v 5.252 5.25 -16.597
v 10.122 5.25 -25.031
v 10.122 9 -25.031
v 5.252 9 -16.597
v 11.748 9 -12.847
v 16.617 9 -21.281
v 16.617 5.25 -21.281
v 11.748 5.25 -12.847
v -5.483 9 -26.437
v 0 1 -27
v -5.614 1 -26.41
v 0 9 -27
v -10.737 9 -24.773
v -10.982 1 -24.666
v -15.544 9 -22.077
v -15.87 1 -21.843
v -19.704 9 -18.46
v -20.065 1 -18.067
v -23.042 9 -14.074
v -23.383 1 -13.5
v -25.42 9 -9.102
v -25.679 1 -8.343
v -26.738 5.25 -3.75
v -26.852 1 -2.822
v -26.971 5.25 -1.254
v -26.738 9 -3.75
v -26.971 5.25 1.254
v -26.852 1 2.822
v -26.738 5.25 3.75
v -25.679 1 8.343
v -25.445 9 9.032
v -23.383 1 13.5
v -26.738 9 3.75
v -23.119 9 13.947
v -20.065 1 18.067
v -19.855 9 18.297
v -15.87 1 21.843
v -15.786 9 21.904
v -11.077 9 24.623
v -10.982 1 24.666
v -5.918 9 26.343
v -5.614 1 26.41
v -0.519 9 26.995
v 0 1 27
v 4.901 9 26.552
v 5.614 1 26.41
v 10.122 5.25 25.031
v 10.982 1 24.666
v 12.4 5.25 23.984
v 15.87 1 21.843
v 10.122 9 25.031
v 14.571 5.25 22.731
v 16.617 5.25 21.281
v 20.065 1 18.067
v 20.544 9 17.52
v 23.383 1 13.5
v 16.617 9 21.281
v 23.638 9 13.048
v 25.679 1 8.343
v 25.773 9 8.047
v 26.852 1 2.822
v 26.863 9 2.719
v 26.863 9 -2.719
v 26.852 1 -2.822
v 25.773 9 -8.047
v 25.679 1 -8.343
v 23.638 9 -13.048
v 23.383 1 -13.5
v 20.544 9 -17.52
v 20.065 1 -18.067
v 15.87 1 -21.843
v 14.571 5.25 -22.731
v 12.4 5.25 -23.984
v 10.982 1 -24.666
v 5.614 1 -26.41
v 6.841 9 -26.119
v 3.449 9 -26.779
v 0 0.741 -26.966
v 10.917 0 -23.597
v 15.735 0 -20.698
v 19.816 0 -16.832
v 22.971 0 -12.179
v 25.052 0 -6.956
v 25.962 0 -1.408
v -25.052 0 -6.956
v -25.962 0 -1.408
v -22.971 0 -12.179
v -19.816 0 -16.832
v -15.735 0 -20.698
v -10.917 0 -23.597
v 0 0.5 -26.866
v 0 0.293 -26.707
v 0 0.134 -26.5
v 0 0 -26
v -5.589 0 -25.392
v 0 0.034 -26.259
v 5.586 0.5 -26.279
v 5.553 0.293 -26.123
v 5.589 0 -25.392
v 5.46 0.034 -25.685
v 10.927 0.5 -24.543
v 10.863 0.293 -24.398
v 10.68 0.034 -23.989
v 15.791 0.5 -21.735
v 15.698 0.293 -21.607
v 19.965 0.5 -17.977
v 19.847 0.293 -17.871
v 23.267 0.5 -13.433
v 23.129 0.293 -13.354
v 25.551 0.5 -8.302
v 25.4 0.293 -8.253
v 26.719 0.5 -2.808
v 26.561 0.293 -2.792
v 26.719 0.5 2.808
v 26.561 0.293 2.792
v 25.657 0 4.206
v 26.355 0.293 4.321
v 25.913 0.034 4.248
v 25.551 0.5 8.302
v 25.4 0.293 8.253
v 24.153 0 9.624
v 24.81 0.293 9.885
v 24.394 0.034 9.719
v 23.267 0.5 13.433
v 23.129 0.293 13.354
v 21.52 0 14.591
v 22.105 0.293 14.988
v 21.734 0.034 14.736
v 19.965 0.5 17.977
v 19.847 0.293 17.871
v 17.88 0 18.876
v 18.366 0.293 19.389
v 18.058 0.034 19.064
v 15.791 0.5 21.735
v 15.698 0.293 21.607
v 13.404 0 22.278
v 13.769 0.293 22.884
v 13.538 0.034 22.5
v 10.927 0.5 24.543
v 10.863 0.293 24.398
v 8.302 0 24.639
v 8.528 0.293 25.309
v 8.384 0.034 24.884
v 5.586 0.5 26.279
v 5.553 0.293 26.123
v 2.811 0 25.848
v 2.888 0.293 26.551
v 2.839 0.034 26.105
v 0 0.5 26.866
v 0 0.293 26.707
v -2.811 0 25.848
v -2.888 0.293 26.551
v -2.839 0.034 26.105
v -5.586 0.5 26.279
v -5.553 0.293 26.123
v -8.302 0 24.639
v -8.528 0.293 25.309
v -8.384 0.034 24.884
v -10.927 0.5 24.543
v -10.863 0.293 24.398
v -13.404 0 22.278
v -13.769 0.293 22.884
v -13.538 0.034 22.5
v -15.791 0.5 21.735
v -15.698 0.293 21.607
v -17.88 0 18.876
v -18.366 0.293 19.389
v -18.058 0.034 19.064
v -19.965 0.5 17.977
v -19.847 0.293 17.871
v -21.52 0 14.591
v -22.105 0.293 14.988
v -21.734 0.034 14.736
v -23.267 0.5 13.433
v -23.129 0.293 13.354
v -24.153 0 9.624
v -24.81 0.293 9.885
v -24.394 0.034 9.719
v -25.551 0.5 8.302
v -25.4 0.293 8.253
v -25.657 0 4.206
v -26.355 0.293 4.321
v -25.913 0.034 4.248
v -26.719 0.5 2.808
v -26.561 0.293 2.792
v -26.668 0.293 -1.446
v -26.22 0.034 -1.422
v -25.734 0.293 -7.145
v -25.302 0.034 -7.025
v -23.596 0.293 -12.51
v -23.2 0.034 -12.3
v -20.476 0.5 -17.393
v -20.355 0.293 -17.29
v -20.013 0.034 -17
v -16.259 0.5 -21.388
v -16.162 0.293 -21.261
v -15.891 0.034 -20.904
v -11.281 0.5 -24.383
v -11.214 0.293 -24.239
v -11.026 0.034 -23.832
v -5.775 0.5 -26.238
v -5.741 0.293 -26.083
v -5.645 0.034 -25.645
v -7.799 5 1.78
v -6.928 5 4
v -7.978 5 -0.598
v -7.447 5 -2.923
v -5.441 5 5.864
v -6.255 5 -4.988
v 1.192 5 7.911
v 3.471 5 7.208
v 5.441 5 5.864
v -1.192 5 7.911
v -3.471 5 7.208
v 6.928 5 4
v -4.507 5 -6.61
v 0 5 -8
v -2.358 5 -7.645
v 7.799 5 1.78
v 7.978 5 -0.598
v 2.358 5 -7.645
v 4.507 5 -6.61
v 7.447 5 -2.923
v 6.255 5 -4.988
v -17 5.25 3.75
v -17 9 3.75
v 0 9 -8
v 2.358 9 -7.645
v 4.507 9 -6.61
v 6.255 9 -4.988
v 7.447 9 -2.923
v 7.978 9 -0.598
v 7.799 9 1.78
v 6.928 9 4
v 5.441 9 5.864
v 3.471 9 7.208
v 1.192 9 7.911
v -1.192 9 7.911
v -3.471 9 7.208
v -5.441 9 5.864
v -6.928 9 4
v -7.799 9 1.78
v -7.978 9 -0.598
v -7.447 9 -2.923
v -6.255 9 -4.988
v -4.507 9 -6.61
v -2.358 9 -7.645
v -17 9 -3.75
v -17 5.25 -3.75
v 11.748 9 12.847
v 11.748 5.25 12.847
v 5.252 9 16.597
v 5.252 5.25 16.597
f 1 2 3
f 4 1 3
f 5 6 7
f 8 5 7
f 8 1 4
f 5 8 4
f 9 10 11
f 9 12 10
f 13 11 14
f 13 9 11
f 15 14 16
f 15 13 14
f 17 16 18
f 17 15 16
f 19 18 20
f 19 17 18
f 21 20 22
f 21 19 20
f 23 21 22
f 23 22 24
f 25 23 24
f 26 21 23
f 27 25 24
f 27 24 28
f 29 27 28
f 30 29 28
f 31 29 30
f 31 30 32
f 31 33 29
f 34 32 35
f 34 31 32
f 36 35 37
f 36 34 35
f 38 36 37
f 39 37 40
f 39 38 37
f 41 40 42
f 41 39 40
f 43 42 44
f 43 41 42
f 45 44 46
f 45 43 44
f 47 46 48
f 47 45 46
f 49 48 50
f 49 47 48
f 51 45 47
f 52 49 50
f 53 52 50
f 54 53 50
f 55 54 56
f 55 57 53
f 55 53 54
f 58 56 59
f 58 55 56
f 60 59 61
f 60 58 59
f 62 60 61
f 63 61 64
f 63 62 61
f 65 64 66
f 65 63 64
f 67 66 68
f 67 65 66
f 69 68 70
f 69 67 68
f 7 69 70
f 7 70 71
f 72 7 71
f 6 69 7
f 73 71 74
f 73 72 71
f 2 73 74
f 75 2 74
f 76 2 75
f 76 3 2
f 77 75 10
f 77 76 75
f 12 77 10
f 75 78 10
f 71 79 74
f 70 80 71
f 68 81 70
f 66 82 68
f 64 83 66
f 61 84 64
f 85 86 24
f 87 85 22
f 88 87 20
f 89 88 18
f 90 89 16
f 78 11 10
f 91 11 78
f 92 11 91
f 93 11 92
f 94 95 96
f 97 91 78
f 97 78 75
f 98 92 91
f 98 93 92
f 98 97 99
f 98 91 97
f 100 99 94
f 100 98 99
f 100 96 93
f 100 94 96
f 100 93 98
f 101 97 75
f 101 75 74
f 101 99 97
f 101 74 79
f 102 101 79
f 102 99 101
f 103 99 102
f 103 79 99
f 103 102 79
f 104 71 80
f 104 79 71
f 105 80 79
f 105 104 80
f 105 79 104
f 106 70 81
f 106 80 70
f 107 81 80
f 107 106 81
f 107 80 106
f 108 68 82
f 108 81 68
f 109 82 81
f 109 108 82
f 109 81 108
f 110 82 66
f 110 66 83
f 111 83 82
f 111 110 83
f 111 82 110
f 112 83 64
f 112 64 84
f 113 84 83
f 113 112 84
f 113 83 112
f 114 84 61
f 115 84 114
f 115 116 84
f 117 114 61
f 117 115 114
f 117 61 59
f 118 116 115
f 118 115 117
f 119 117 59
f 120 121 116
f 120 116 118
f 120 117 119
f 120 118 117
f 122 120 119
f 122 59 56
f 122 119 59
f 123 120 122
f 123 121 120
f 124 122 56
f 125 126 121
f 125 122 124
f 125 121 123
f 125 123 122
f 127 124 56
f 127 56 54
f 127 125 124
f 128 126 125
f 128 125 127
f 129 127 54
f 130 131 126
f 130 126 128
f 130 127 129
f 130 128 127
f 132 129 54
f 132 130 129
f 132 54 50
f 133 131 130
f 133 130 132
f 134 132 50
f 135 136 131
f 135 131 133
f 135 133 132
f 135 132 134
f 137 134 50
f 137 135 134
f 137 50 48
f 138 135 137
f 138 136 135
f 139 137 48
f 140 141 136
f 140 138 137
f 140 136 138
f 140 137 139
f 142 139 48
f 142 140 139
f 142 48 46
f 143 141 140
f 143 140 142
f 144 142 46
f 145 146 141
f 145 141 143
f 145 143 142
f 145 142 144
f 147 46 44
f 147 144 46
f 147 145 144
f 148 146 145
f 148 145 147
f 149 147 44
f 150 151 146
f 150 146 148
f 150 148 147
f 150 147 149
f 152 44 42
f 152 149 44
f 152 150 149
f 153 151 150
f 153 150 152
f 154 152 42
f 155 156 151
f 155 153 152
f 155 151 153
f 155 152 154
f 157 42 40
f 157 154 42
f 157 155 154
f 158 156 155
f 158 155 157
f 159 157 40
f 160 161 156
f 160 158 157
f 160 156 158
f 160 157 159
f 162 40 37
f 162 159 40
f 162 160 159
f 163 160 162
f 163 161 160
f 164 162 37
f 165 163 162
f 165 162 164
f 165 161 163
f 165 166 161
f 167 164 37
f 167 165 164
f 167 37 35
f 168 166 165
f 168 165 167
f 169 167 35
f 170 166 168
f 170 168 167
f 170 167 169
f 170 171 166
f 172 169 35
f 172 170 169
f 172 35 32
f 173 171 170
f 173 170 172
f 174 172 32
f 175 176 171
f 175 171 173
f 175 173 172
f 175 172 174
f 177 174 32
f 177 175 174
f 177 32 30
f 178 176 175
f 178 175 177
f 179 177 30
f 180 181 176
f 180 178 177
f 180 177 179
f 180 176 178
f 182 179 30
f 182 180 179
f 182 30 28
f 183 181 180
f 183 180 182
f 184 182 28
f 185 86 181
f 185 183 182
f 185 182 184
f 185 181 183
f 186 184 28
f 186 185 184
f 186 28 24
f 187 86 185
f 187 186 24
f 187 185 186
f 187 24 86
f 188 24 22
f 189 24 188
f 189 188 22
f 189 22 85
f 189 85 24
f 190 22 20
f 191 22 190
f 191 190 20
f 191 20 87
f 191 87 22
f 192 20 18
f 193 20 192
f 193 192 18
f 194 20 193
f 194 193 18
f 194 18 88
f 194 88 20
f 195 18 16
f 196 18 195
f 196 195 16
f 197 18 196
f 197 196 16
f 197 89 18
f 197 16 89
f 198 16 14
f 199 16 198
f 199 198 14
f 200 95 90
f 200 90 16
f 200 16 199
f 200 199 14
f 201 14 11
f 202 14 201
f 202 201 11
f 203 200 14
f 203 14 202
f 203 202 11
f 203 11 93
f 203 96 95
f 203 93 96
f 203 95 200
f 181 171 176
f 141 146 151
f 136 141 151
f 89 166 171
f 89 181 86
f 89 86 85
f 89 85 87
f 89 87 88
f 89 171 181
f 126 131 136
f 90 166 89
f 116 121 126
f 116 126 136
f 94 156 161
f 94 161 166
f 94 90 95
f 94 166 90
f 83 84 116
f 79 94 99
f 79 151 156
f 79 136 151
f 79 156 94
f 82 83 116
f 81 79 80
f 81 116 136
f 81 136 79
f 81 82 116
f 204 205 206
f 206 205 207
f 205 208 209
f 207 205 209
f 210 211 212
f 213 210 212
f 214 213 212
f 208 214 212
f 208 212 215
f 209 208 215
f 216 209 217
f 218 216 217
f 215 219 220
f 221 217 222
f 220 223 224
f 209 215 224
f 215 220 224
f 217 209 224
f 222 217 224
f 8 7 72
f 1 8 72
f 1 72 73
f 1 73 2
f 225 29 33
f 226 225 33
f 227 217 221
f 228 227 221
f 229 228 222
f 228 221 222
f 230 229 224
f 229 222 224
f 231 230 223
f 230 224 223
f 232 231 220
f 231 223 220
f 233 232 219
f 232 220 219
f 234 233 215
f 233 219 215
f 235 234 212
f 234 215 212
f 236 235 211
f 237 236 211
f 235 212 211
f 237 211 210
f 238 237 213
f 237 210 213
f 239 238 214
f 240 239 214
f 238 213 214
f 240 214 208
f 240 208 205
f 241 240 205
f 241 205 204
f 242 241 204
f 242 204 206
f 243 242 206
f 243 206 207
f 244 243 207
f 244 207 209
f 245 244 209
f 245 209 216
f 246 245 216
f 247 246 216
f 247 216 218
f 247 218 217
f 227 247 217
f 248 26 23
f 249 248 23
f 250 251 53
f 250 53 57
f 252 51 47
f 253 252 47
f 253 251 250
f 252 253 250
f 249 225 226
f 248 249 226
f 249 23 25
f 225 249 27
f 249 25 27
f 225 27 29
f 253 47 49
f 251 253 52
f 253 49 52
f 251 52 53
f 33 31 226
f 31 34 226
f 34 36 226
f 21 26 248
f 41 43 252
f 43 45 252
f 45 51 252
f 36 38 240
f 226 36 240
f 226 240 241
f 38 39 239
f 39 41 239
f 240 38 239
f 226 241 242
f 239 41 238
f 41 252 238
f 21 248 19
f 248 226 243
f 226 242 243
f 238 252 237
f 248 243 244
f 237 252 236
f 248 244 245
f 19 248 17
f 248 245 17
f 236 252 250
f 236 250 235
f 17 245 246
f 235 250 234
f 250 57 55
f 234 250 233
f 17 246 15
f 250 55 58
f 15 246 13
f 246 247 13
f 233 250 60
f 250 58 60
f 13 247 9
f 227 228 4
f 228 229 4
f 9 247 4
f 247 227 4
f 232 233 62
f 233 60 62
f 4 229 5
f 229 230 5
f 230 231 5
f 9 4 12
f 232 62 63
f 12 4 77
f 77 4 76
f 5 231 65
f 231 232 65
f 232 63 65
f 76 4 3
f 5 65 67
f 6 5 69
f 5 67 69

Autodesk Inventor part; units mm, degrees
ref_plane "XY Plane" through (0, 0, 0) normal (0, 0, 1) x (1, 0, 0)
sketch "Sketch3" plane through (0, 0, 0) normal (1, 0, 0) x (0, 1, 0)
  line L0 (63.5252, 0) -> (0, 0) construction
  line L1 (0, -8) -> (0, -27)
  line L2 (0, -27) -> (18, -27)
  line L3 (18, -27) -> (18, -12.4)
  line L4 (9, -8) -> (9, -12.4)
  line L5 (9, -12.4) -> (18, -12.4)
  line L6 (9, -8) -> (5, -8)
  line L7 (5, -8) -> (5, 0)
  line L8 (0, -8) -> (0, 0)
  line L9 (5, 0) -> (0, 0)
  dimension "d15" = 18
  dimension "d18" = 9
  dimension "d32" = 27
  dimension "d33" = 12.4
  dimension "d54" = 4
  dimension "d56" = 8
revolve "Revolution1" add sketch "Sketch3" angle 360 about axis through (0, 63.5252, 0) along (0, -1, 0)
fillet "Fillet2" radius 1 2 edges at (0, 18, 27) (0, 0, 27)
ref_plane "Work Plane2" through (-27, 9, 0) normal (1, 0, 0) x (0, 1, 0)
sketch "Sketch4" plane through (-27, 9, 0) normal (1, 0, 0) x (0, 1, 0)
  line L0 (-9, 0) -> (10.8256, 0) construction
  line L1 (-3.75, 3.75) -> (3.75, 3.75)
  line L2 (3.75, 3.75) -> (3.75, -3.75)
  line L3 (3.75, -3.75) -> (-3.75, -3.75)
  line L4 (-3.75, -3.75) -> (-3.75, 3.75)
  line L5 (-3.75, 3.75) -> (3.75, -3.75) construction
  line L6 (3.75, 3.75) -> (-3.75, -3.75) construction
  line L7 (9, 26) -> (9, -26) projected
  point P0 (0, 0)
  dimension "d21" = 7.5
  dimension "d22" = 7.5
  dimension "d55" = 9
extrude "Extrusion3" cut sketch "Sketch4" along normal blind 10
pattern_circular "Circular Pattern2" count 3 over 360 about axis through (0, 13.5, 0) along (0, -1, 0) of "Extrusion3"
sketch "Sketch9" plane through (0, 18, 0) normal (0, 1, 0) x (1, 0, 0)
  circle A0 centre (0, -22.4737) radius 3.5
  point P0 (0, 0)
  dimension "d57" = 7
extrude "Extrusion7" cut sketch "Sketch9" against normal blind 2.4
ref_plane "Work Plane4" through (0, 9, 0) normal (0, 1, 0) x (-1, 0, 0)
split "Split1" plane through (0, 9, 0) removes the side toward (0, 1, 0)
properties part number "BasePaletasTop"
